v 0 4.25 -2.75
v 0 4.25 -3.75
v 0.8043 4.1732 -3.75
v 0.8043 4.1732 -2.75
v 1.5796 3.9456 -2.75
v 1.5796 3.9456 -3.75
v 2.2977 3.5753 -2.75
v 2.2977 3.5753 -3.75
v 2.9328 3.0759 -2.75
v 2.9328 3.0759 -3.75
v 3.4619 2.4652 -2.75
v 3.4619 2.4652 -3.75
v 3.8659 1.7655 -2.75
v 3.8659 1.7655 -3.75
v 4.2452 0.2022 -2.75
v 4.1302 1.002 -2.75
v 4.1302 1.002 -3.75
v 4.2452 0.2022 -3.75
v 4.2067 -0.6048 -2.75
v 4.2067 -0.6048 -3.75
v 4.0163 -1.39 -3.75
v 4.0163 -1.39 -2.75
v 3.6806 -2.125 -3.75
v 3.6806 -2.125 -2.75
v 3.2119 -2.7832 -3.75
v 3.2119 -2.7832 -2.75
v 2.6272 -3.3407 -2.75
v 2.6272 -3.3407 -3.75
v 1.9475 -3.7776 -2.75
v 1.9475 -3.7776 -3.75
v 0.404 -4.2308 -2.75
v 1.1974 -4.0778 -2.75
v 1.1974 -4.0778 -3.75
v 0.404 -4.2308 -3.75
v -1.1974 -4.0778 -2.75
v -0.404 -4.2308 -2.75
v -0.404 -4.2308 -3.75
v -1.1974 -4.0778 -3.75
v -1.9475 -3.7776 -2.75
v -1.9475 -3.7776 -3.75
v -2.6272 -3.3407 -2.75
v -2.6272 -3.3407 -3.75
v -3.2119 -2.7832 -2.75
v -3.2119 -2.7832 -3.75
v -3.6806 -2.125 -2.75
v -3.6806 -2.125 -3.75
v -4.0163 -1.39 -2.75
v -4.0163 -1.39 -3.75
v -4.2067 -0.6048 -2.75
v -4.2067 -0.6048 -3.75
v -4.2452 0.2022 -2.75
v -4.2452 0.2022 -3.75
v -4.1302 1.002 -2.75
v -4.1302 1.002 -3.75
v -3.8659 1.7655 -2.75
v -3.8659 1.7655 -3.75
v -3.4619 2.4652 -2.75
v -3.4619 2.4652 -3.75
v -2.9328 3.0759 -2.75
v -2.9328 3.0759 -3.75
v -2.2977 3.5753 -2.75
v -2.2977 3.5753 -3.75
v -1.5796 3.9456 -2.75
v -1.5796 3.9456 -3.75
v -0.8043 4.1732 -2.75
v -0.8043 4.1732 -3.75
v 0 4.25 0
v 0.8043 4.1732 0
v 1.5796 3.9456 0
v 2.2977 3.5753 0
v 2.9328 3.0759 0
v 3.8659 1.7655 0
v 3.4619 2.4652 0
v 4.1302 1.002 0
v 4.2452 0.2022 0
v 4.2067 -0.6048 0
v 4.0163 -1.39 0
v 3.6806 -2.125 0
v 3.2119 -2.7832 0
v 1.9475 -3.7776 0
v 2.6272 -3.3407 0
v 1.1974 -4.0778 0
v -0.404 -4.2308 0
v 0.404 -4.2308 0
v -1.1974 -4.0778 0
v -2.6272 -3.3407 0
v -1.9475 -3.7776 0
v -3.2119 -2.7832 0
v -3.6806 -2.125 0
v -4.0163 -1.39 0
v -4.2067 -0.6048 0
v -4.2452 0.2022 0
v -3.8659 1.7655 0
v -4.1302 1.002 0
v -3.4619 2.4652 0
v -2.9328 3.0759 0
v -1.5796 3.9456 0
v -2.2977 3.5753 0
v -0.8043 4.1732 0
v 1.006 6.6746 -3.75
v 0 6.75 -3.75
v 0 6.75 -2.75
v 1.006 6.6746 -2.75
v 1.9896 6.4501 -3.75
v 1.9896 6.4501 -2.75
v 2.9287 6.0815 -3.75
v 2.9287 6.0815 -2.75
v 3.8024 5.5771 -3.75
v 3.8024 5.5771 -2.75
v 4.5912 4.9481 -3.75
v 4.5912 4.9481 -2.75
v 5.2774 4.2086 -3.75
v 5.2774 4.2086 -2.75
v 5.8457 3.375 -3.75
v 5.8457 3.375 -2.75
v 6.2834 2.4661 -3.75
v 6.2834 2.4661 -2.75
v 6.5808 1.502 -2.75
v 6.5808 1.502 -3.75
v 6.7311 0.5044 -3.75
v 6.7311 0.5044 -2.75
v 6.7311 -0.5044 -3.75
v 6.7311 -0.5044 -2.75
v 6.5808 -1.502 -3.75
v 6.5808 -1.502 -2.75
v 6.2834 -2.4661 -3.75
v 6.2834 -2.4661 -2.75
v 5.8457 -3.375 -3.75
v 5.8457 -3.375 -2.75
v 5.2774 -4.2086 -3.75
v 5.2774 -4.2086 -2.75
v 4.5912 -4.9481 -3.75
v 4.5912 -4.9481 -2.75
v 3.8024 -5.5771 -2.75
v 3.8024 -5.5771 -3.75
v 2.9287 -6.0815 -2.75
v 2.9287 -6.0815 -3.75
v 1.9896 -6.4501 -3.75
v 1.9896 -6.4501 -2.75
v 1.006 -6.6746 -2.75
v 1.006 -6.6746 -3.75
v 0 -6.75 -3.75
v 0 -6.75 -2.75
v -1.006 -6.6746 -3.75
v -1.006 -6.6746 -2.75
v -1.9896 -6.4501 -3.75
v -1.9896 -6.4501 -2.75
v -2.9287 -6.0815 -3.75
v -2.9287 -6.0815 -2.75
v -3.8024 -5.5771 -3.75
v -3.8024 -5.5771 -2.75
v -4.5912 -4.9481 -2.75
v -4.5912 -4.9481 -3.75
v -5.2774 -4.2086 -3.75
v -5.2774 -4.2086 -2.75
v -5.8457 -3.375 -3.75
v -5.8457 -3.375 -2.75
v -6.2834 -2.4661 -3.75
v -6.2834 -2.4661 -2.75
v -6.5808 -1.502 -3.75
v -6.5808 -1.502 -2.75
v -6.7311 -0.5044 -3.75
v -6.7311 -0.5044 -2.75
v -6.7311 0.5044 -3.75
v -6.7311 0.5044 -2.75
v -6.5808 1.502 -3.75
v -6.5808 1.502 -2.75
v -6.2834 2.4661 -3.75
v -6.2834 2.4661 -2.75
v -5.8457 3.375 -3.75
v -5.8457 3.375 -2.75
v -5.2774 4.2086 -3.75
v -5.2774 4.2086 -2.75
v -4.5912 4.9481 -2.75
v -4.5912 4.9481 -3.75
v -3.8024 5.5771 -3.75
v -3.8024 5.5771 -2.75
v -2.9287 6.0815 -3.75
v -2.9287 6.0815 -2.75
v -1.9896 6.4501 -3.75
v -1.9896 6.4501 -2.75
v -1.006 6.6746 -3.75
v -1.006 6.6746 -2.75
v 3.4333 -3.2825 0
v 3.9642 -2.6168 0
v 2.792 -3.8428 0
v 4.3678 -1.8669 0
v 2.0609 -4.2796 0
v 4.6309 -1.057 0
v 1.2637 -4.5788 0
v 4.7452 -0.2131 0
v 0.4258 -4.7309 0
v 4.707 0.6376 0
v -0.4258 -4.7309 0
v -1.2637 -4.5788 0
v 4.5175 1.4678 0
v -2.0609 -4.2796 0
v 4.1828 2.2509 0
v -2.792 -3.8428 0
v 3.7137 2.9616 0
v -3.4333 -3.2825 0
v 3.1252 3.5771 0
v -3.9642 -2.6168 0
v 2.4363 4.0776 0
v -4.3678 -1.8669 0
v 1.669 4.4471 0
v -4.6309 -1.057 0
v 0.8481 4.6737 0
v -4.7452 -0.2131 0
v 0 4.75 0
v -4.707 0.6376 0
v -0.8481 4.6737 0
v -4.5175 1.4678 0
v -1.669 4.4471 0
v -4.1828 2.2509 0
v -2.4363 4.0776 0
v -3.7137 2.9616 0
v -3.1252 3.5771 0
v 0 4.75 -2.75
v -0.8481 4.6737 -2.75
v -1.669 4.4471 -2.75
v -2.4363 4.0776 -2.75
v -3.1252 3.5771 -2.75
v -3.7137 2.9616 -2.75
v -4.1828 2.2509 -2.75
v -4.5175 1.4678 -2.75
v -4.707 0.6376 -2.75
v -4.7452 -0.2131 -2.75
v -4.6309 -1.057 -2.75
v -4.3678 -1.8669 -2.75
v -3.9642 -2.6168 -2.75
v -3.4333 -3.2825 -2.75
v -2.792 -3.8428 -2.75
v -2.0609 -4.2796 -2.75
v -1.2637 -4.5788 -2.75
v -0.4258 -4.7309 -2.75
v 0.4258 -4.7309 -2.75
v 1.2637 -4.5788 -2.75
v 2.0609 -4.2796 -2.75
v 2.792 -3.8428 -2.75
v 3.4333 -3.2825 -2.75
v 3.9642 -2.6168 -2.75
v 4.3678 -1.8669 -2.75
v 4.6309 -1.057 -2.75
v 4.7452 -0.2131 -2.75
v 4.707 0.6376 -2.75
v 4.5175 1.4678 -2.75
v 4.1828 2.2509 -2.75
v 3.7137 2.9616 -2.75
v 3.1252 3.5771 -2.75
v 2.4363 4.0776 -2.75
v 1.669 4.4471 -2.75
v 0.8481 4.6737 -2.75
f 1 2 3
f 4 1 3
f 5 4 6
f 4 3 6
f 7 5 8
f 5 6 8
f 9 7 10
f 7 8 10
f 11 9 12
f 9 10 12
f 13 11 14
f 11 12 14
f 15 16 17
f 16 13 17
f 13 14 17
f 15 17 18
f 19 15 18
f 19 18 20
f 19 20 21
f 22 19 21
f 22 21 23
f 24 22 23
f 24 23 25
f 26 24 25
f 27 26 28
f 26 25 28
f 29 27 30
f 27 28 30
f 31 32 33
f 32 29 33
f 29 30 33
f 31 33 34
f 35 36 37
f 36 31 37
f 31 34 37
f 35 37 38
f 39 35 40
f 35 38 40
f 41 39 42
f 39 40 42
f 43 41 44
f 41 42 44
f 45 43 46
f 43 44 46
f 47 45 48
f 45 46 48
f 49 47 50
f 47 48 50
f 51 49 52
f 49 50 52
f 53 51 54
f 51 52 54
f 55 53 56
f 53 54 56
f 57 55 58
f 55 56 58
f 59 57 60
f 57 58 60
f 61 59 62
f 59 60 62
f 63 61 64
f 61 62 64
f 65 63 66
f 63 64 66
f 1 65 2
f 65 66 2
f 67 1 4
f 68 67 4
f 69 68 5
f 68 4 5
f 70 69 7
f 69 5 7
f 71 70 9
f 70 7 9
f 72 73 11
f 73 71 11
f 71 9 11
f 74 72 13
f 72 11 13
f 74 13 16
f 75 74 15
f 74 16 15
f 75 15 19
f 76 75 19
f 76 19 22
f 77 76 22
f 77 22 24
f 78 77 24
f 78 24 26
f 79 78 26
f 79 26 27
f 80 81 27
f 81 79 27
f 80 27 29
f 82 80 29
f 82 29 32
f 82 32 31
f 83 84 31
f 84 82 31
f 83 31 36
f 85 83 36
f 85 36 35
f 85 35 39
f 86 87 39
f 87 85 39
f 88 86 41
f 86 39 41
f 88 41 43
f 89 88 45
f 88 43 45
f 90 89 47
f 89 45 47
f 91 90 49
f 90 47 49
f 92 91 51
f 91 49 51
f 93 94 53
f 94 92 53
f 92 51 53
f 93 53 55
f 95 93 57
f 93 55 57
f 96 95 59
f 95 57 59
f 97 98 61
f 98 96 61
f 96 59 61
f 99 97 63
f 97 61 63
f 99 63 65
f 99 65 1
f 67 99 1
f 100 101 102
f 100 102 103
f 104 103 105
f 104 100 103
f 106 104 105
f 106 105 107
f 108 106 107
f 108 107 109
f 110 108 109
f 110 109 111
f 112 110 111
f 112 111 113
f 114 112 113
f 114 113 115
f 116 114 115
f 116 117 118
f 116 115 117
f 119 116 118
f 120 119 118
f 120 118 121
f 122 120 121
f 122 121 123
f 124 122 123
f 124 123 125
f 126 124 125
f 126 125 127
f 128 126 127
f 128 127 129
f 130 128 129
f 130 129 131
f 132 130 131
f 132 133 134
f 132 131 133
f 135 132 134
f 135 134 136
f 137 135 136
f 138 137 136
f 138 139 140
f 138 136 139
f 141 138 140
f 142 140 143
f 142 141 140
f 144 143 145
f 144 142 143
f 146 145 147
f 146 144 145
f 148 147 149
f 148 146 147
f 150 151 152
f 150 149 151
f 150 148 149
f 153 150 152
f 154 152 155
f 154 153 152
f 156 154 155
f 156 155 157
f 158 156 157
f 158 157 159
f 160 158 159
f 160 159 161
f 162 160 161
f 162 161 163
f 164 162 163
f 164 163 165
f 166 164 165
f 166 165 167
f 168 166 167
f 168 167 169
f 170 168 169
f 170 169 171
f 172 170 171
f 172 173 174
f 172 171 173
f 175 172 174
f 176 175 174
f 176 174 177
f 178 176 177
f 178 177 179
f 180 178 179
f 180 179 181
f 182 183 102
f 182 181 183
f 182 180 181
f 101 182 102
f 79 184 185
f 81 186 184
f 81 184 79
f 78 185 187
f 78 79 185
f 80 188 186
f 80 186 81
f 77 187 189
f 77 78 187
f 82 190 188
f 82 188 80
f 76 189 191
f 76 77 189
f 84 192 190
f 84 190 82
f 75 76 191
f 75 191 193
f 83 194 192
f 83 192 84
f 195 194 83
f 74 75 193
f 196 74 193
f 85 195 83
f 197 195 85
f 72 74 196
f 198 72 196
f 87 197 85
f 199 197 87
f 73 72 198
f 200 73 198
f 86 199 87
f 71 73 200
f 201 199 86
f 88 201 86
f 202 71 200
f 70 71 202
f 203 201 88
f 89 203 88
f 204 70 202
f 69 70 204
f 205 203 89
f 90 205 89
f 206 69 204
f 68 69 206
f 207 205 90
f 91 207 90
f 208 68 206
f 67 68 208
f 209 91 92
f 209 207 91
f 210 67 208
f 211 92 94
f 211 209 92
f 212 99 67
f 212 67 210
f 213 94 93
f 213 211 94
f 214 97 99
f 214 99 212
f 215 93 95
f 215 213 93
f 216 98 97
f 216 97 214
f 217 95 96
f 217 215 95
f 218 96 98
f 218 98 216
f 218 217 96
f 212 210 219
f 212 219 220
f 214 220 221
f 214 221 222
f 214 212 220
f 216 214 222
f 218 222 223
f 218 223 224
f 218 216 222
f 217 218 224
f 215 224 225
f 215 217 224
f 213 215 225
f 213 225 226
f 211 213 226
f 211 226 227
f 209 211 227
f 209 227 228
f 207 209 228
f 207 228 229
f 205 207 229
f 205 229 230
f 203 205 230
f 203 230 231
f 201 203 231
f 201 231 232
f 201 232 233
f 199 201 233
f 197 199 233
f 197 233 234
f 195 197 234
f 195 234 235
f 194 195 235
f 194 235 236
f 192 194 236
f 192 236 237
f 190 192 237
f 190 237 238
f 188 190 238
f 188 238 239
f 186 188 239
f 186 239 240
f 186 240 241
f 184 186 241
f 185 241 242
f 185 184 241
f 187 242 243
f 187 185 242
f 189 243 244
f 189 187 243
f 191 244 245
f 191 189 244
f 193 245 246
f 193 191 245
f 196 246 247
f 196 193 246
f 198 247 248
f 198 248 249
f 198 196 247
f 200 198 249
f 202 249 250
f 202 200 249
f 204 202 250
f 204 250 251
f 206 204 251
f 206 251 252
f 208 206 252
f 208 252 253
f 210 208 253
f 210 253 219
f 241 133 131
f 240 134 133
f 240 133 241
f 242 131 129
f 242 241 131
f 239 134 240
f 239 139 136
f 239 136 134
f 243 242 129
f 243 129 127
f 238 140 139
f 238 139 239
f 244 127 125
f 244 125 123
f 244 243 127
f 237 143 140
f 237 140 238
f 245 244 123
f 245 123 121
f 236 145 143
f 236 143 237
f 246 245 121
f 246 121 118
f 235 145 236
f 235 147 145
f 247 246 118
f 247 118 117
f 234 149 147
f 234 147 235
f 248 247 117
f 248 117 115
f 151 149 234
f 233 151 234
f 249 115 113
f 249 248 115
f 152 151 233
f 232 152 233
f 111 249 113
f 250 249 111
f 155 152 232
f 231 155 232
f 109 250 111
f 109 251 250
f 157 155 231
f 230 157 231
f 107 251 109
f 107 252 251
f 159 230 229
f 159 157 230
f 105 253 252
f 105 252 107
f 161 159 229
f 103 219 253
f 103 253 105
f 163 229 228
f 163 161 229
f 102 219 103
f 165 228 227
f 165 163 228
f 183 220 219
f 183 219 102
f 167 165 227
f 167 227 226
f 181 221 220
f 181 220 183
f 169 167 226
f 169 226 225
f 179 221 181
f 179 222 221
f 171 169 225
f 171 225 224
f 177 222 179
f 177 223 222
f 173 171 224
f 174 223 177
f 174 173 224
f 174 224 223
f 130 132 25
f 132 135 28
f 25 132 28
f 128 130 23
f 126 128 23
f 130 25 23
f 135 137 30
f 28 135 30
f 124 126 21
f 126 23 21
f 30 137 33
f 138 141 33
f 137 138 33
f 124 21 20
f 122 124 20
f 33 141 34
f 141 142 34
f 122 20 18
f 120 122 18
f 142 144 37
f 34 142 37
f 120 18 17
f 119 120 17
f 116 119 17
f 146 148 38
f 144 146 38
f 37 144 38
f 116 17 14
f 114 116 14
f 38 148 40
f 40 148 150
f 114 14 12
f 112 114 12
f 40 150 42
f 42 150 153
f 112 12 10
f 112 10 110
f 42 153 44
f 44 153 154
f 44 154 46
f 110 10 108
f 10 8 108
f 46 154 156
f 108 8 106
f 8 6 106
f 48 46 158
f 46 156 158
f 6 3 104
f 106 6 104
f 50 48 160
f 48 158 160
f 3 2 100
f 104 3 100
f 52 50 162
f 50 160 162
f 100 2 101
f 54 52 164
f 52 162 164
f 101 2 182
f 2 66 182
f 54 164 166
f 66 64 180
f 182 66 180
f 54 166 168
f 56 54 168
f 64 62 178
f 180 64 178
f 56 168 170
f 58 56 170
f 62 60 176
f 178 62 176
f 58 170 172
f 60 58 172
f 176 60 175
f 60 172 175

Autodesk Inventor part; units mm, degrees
ref_plane "YZ Plane" through (0, 0, 0) normal (1, 0, 0) x (0, 1, 0)
ref_plane "XZ Plane" through (0, 0, 0) normal (0, 1, 0) x (-1, 0, 0)
ref_plane "XY Plane" through (0, 0, 0) normal (0, 0, 1) x (1, 0, 0)
sketch "Sketch1" plane through (0, 0, 0) normal (1, 0, 0) x (0, 1, 0)
  line L0 (4.25, 0) -> (4.25, -3.75)
  line L1 (0, -2.75) -> (0, 0)
  line L2 (4.75, -2.75) -> (4.75, 0)
  line L3 (4.75, 0) -> (4.25, 0)
  line L4 (4.25, 0) -> (4.25, -2.75)
  line L5 (6.75, -2.75) -> (6.75, -3.75)
  line L6 (6.75, -3.75) -> (4.25, -3.75)
  line L7 (4.75, -2.75) -> (6.75, -2.75)
  point P0 (4.1, 0)
  dimension "d3" = 2.5
  dimension "d4" = 1
  dimension "d5" = 2.75
  dimension "d6" = 4.75
  dimension "d8" = 4.25
revolve "Revolution1" add sketch "Sketch1" angle 360 about axis through (0, 0, -2.75) along (0, 0, 1)
properties part number "Ø10-Ø8Prop"
